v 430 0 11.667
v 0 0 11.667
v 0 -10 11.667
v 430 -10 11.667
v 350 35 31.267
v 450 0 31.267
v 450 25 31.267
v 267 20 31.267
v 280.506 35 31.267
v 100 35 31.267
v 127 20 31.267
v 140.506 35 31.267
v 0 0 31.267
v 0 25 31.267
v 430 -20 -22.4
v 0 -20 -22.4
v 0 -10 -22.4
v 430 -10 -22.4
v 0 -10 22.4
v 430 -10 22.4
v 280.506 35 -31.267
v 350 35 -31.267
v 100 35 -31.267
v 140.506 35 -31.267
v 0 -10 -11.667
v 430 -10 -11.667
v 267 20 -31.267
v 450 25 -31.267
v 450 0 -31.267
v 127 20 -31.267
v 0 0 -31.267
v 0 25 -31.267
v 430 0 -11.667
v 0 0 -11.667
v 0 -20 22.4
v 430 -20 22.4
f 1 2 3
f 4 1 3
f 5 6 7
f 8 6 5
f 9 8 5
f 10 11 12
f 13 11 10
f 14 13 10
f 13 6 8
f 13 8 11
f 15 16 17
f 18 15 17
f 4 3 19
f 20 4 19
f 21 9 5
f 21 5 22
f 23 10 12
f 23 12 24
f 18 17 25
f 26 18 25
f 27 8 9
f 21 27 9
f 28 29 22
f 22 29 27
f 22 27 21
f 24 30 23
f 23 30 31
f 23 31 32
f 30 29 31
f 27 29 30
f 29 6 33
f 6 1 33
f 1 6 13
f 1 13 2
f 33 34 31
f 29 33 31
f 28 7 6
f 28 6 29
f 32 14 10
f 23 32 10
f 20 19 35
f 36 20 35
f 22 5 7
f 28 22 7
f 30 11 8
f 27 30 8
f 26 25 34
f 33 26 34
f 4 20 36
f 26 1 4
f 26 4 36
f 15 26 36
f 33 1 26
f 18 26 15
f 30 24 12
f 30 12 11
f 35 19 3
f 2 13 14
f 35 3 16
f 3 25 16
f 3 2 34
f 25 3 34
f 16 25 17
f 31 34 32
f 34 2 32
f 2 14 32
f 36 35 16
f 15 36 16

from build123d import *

# Parameters (mm, degrees)
BOSS_EXTRUDE1_DEPTH = 430
BOSS_EXTRUDE2_DEPTH = 450
CUT_EXTRUDE1_REACH  = 457.67


with BuildPart() as part:
    # Sketch1 → Boss-Extrude1 (new body)
    with BuildSketch(Plane(origin=(0, 0, 0), x_dir=(0, 0, -1), z_dir=(1, 0, 0))):
        Polygon((11.666666667, 0), (-11.666666667, 0), (-11.666666667, -10), (-22.4, -10), (-22.4, -20), (22.4, -20), (22.4, -10), (11.666666667, -10), align=None)
    extrude(amount=BOSS_EXTRUDE1_DEPTH)

    # Sketch1<3> → Boss-Extrude2 (add)
    with BuildSketch(Plane(origin=(0, 0, 0), x_dir=(0, 0, -1), z_dir=(1, 0, 0))):
        Polygon((31.266666667, 35), (-31.266666667, 35), (-31.266666667, 0), (-11.666666667, 0), (11.666666667, 0), (31.266666667, 0), align=None)
    extrude(amount=BOSS_EXTRUDE2_DEPTH)

    # Sketch2 → Cut-Extrude1 (cut, up to next)
    with BuildSketch(Plane.XY.offset(31.266666667), mode=Mode.PRIVATE) as cut_extrude1_sk1:
        Polygon((0, 35), (0, 25), (100, 35), align=None)
    cut_extrude1_tool1 = extrude(cut_extrude1_sk1.sketch, amount=-CUT_EXTRUDE1_REACH, mode=Mode.PRIVATE) & part.part
    # Sketch2 → Cut-Extrude1 (cut, up to next)
    with BuildSketch(Plane.XY.offset(31.266666667), mode=Mode.PRIVATE) as cut_extrude1_sk2:
        Polygon((450, 35), (350, 35), (450, 25), align=None)
    cut_extrude1_tool2 = extrude(cut_extrude1_sk2.sketch, amount=-CUT_EXTRUDE1_REACH, mode=Mode.PRIVATE) & part.part
    # Sketch2 → Cut-Extrude1 (cut, up to next)
    with BuildSketch(Plane.XY.offset(31.266666667), mode=Mode.PRIVATE) as cut_extrude1_sk3:
        Polygon((280.506060664, 35), (140.506060664, 35), (127, 20), (267, 20), align=None)
    cut_extrude1_tool3 = extrude(cut_extrude1_sk3.sketch, amount=-CUT_EXTRUDE1_REACH, mode=Mode.PRIVATE) & part.part
    add(cut_extrude1_tool1.solids().sort_by_distance((33.333333, 31.666667, 31.266667))[0], mode=Mode.SUBTRACT)
    add(cut_extrude1_tool2.solids().sort_by_distance((416.666667, 31.666667, 31.266667))[0], mode=Mode.SUBTRACT)
    add(cut_extrude1_tool3.solids().sort_by_distance((203.75303, 27.5, 31.266667))[0], mode=Mode.SUBTRACT)


solid = part.part
